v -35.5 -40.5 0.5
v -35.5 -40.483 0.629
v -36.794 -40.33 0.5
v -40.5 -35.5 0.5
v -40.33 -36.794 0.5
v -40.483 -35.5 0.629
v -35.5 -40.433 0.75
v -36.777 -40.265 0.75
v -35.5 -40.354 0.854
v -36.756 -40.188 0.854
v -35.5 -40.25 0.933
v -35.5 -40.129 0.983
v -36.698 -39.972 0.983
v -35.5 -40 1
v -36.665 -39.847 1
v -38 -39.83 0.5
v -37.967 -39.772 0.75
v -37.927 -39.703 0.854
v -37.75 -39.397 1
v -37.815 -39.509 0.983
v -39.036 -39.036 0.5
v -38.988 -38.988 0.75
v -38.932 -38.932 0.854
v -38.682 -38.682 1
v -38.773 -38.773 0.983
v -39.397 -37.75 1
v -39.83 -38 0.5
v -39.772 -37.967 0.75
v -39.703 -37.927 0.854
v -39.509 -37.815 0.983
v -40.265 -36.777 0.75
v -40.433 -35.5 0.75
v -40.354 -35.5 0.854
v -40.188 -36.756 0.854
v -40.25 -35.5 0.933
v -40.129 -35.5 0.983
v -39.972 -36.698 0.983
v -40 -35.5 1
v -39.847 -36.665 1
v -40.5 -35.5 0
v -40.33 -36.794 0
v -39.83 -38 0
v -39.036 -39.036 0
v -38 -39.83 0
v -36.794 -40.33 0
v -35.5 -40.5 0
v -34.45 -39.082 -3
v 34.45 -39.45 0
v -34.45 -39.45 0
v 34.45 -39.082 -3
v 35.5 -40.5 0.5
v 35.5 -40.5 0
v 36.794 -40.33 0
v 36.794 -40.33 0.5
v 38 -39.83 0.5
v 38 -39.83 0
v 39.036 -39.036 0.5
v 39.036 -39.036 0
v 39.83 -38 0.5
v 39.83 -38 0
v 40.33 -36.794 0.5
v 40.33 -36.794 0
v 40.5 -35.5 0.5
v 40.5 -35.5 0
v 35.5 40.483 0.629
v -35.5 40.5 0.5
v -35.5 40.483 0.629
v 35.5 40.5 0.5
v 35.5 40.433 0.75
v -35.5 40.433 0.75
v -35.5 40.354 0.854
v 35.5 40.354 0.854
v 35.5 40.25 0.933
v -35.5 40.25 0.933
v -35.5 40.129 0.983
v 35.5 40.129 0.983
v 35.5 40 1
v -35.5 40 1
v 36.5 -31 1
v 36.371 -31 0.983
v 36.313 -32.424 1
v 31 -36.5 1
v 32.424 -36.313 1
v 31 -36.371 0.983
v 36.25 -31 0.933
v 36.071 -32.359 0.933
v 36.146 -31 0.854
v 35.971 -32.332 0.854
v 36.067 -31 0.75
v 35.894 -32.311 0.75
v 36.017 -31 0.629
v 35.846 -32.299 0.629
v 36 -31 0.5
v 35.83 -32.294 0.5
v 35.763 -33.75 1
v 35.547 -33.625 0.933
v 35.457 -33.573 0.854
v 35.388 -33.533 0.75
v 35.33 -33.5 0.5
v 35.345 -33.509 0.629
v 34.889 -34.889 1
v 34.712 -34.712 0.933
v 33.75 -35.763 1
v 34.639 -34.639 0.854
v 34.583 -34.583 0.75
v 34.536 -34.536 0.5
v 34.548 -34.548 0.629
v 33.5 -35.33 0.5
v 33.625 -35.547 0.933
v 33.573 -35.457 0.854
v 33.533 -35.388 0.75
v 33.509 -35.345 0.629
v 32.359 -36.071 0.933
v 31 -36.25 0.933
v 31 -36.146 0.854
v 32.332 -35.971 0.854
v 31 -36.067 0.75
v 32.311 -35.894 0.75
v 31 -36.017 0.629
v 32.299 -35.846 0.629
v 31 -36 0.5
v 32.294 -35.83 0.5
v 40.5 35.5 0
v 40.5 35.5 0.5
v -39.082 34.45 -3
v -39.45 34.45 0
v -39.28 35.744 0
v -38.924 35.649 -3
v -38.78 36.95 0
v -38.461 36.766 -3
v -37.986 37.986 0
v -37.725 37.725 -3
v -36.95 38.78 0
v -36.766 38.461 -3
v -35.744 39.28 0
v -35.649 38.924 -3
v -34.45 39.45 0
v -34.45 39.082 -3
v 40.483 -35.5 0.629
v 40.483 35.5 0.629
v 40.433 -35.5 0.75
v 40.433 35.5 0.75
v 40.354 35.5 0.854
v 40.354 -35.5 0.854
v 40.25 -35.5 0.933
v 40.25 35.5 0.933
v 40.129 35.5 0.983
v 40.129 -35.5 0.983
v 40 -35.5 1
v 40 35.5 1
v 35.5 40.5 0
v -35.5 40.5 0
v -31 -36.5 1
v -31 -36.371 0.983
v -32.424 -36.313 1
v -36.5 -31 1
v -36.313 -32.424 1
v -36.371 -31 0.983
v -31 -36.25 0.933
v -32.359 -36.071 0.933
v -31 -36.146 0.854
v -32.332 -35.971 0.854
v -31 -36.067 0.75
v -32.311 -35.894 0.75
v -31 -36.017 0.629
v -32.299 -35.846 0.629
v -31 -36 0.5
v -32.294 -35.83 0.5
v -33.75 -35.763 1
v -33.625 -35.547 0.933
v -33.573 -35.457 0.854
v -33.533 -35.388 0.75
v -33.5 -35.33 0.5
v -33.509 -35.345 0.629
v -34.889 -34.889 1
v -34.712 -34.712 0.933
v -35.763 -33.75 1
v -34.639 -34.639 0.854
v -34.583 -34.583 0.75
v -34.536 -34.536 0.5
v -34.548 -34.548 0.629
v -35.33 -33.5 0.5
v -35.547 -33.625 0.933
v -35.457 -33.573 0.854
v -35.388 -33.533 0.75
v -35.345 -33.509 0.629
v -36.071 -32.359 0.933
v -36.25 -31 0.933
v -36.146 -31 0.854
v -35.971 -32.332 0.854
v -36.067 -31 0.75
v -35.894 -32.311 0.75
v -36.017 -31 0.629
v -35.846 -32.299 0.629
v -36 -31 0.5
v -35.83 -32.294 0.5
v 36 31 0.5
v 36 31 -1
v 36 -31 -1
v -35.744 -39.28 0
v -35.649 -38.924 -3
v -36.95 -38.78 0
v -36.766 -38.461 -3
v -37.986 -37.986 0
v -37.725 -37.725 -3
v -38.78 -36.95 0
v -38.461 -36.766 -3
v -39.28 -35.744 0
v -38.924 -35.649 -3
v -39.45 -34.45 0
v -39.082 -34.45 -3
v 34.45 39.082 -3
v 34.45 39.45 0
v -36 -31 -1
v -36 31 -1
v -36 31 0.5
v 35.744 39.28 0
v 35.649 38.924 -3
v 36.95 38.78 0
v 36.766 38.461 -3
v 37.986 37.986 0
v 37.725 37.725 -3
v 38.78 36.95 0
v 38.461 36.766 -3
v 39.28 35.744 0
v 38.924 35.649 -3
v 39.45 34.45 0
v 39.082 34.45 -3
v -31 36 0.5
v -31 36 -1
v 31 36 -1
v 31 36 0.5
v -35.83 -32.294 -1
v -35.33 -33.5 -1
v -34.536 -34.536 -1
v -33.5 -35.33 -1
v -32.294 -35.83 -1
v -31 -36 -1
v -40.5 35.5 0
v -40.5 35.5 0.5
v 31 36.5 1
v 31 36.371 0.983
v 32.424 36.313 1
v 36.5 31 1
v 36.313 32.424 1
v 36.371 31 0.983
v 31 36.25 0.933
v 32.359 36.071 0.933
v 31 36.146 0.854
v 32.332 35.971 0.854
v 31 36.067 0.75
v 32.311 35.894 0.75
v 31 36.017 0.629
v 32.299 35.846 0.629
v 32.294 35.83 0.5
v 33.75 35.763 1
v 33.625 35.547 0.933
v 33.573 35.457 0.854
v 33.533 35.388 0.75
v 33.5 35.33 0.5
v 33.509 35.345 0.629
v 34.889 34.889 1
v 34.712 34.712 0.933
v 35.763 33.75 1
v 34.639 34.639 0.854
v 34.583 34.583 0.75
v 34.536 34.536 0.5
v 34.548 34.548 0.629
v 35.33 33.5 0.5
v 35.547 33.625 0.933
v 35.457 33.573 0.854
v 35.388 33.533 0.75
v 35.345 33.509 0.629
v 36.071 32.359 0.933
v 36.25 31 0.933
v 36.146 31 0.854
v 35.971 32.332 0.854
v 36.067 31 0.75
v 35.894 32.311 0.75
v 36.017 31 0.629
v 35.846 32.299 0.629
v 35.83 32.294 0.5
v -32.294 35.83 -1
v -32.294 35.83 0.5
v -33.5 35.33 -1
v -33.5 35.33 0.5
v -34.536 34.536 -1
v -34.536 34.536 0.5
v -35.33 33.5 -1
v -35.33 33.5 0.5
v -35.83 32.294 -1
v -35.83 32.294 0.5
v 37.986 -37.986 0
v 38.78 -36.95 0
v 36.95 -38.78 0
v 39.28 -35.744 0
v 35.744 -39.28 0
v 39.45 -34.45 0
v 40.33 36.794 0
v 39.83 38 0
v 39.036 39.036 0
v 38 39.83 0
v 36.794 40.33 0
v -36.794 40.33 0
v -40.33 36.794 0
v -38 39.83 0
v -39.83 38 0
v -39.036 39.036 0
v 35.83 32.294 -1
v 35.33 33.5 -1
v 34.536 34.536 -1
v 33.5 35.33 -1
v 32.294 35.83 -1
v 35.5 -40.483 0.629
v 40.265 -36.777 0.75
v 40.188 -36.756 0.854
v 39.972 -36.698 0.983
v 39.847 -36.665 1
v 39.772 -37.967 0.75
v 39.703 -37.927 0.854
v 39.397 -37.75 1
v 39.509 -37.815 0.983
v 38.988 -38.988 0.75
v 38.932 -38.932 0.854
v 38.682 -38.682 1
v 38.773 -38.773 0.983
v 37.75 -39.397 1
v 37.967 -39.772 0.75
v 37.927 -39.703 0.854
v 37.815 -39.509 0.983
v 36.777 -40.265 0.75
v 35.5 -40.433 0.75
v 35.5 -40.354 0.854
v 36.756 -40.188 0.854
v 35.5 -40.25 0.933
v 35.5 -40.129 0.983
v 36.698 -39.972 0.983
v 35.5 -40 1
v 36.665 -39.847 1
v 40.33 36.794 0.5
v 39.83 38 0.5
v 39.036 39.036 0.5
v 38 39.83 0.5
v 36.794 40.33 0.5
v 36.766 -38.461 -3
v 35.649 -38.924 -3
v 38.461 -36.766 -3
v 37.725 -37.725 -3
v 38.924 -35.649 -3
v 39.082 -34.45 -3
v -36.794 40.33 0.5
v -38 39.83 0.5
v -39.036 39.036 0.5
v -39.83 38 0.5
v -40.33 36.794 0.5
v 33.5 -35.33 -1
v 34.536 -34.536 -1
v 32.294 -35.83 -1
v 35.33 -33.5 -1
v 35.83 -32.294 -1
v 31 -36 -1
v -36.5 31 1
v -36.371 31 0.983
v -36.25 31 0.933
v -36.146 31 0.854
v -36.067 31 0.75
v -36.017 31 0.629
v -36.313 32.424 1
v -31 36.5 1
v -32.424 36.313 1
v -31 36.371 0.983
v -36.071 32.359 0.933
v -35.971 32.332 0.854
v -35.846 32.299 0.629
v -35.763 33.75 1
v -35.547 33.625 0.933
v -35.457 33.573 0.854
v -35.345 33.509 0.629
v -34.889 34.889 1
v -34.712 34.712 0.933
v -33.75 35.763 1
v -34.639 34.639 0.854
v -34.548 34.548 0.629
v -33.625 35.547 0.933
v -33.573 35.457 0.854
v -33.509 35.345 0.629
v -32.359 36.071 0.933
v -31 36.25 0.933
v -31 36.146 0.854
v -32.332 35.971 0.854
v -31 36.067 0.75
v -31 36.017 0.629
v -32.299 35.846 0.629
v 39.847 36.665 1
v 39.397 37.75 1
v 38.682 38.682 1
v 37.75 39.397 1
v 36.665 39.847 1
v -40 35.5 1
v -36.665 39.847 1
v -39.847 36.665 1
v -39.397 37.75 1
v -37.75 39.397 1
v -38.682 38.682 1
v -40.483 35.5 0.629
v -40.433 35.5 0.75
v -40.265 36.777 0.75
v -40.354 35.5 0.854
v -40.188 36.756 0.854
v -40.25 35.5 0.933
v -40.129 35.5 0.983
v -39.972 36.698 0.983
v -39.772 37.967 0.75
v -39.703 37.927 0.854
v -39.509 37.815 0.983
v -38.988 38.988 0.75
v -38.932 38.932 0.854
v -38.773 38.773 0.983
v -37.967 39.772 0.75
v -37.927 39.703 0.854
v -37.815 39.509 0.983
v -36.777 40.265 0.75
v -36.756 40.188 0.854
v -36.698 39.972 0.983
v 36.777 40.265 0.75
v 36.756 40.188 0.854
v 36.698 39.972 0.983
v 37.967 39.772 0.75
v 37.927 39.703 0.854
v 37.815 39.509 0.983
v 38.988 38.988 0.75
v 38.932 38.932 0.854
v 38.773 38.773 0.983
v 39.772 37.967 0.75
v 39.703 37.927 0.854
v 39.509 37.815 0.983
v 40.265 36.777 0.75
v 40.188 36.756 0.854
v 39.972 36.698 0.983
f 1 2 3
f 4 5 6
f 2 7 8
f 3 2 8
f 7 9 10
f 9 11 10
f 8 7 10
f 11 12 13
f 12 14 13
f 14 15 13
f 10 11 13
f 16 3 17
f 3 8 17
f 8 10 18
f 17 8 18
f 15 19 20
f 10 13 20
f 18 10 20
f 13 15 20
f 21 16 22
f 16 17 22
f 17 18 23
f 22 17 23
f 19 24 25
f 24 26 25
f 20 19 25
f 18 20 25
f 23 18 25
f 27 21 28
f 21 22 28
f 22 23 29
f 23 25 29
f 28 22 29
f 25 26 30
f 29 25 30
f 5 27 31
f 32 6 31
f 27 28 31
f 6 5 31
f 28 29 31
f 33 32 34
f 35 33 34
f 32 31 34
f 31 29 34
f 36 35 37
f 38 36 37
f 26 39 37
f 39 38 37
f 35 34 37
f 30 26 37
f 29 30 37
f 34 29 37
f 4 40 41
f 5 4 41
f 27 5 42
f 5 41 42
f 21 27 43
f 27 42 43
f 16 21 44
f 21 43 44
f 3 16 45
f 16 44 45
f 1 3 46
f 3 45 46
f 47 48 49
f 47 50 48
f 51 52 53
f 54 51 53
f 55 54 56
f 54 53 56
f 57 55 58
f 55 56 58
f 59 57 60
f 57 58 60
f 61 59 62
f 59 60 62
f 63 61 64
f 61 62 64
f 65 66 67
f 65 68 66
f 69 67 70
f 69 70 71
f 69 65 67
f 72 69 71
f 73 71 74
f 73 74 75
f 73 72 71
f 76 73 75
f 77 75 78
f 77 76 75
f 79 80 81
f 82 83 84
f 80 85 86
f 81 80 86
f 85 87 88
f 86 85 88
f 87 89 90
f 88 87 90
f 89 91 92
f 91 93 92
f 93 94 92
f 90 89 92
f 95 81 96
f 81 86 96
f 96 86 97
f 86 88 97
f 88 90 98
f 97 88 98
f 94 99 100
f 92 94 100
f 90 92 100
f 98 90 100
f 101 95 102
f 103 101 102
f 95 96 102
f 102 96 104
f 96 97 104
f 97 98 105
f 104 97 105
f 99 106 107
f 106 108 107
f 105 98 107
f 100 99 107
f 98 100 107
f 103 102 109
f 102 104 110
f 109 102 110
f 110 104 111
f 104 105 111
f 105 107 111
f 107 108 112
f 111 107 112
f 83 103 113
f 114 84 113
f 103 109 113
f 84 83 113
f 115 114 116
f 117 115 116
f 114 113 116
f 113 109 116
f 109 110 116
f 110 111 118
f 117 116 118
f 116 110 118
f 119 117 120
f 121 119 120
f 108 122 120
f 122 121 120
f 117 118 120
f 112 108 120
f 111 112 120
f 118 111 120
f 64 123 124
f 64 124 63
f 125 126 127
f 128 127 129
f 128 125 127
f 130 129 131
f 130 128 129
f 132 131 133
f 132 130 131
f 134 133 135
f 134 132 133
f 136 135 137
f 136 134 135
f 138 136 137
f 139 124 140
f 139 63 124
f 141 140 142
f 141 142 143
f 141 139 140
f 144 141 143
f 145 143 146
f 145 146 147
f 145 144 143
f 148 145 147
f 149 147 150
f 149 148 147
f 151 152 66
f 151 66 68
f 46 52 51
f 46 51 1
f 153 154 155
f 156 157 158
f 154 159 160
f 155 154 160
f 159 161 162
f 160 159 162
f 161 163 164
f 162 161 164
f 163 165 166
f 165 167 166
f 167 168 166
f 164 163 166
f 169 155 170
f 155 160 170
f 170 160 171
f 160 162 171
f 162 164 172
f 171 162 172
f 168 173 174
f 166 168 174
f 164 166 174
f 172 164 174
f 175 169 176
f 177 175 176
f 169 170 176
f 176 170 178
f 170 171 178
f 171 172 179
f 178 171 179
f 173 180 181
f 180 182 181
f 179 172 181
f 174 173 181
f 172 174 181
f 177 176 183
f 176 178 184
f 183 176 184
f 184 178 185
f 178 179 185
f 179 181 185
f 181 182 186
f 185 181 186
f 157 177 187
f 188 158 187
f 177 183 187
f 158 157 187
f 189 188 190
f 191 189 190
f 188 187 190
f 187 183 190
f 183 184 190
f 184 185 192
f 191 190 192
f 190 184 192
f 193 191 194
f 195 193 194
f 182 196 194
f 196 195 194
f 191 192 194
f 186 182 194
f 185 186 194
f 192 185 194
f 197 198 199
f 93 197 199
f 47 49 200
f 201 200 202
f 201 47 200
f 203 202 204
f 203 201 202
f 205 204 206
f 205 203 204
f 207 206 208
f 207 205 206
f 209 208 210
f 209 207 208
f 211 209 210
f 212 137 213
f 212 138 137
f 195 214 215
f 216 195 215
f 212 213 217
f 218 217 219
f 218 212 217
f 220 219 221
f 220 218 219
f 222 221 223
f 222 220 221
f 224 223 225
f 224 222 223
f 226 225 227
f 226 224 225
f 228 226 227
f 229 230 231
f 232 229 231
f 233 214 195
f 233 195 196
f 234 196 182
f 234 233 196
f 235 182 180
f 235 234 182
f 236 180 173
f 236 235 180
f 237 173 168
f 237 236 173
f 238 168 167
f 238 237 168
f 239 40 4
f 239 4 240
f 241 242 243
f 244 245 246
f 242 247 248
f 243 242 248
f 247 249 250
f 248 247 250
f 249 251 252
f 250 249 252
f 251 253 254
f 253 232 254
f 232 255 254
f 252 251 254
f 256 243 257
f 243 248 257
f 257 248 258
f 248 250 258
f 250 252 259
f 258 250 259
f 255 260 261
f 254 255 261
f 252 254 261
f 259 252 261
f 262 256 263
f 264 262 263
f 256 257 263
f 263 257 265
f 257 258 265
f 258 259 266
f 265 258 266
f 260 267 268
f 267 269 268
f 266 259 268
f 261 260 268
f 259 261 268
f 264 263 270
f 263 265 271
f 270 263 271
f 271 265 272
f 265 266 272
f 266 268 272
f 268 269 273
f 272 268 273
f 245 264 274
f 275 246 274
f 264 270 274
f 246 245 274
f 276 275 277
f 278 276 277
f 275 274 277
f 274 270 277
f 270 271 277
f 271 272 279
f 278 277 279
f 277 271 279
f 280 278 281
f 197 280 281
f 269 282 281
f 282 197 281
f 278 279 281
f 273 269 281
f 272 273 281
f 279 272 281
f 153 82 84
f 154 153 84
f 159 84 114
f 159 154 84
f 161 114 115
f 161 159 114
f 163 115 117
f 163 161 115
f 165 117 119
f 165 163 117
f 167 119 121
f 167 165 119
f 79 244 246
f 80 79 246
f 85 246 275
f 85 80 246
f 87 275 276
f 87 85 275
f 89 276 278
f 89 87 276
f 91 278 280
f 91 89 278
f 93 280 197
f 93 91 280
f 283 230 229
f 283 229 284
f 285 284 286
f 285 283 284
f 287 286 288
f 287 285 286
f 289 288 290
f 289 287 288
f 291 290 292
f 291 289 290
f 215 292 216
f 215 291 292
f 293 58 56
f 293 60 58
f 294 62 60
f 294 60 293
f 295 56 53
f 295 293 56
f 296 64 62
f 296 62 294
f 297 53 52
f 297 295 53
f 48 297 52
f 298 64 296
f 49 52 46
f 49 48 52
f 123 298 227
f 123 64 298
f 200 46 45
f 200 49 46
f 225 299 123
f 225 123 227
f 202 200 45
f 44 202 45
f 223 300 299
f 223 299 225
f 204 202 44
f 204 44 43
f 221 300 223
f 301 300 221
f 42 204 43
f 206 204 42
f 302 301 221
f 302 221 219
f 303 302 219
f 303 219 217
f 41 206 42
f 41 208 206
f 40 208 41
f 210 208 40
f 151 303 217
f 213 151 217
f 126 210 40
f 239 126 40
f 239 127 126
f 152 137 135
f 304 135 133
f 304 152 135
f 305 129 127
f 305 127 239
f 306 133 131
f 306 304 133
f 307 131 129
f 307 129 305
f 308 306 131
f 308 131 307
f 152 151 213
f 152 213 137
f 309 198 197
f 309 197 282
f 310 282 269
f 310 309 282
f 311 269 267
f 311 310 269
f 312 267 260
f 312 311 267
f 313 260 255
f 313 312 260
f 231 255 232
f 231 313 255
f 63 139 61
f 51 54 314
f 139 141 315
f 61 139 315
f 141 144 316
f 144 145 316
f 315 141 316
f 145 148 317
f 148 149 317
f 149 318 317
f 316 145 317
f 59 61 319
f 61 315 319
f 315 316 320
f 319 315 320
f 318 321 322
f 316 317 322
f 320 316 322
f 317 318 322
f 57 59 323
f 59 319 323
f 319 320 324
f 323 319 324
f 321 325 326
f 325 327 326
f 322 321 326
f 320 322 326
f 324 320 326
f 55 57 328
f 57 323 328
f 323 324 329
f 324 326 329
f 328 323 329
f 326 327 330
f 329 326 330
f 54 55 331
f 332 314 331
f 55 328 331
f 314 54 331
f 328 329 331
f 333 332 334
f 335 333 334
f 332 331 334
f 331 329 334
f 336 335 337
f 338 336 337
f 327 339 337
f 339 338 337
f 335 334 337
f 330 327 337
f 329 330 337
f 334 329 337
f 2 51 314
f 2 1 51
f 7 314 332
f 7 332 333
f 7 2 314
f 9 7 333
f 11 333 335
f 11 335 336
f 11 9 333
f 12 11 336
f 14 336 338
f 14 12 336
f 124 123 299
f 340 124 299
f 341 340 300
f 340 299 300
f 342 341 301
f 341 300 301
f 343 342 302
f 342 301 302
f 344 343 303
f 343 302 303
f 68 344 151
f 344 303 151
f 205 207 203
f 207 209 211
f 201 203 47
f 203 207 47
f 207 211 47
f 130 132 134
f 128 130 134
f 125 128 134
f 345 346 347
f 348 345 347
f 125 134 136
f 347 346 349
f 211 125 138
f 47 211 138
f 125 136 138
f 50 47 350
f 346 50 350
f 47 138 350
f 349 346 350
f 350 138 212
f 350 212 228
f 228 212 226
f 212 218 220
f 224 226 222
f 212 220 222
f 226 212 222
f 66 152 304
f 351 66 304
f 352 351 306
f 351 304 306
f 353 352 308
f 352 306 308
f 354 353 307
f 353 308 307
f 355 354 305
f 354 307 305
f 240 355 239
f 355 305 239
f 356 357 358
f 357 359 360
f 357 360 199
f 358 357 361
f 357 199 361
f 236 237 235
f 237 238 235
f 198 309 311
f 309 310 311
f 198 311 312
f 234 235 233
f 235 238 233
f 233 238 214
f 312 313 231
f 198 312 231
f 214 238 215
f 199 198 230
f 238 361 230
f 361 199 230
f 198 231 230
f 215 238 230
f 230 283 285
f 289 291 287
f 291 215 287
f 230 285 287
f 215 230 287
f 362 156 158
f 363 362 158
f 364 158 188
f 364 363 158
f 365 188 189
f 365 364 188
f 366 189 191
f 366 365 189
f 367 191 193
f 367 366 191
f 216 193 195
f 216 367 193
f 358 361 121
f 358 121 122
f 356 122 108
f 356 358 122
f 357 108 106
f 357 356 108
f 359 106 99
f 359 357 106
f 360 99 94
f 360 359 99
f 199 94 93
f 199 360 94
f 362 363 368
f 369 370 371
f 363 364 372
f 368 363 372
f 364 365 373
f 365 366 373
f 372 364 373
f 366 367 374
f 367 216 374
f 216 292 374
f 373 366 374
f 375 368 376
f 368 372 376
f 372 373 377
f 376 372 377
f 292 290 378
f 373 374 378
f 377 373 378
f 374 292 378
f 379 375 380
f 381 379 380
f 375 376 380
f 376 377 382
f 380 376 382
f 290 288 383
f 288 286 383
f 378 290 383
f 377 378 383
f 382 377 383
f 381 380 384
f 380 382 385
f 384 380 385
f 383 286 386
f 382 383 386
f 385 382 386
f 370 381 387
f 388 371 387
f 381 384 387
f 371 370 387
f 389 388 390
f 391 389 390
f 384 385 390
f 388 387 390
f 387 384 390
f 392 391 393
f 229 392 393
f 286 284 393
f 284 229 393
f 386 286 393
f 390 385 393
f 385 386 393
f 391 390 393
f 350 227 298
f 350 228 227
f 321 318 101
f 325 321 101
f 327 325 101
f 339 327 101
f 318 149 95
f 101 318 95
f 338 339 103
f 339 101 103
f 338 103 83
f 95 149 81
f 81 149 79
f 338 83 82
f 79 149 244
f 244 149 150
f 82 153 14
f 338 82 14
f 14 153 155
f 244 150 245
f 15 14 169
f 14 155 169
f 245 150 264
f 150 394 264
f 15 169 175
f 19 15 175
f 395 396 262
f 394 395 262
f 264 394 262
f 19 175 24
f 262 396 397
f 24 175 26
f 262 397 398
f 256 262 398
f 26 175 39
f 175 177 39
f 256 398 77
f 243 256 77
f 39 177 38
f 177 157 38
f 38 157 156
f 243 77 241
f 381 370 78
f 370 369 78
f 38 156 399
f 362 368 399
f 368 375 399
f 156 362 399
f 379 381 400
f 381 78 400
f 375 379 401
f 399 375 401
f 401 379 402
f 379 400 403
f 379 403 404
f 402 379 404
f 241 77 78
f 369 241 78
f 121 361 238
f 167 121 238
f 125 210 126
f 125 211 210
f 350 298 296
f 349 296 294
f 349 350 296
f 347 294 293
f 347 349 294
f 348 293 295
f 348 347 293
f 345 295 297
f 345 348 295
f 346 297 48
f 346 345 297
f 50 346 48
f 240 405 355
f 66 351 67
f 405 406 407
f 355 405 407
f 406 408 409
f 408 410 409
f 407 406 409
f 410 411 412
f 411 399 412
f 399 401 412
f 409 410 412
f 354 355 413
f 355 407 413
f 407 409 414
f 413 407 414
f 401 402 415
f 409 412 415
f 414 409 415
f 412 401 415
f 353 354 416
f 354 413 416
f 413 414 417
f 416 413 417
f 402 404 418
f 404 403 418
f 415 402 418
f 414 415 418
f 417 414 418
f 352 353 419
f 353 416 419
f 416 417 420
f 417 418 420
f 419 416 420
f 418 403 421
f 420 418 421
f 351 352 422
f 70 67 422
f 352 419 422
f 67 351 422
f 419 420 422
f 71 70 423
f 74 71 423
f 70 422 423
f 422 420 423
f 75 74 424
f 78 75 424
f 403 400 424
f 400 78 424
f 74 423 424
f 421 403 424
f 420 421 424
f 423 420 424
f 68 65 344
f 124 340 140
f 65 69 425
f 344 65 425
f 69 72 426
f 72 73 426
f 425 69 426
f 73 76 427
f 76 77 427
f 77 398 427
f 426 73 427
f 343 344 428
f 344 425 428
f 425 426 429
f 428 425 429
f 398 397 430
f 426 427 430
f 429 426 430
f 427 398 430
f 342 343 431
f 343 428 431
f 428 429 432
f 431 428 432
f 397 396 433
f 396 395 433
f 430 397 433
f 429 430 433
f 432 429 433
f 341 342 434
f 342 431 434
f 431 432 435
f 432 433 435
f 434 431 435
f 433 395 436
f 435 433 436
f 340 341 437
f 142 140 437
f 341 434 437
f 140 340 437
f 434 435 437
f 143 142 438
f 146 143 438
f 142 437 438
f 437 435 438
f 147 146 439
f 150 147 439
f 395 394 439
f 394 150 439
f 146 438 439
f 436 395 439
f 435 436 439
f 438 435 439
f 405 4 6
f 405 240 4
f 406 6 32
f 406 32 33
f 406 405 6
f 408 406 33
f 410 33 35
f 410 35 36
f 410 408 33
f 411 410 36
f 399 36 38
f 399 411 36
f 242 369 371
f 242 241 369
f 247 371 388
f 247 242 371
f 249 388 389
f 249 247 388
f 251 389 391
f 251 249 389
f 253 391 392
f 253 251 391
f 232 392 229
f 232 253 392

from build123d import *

# Parameters (mm, degrees)
PAD_DEPTH    = 1
PAD001_DEPTH = 3
PAD001_TAPER = 7
POCKET_DEPTH = 2.001
FILLET002_R  = 0.5


with BuildPart() as part:
    # Sketch005 → Pad (new body)
    with BuildSketch(Plane.XY):
        with BuildLine():
            Line((-35.5, 40.5), (35.5, 40.5))
            ThreePointArc((40.5, 35.5), (39.035534, 39.035534), (35.5, 40.5))
            Line((40.5, 35.5), (40.5, -35.5))
            ThreePointArc((35.5, -40.5), (39.035534, -39.035534), (40.5, -35.5))
            Line((35.5, -40.5), (-35.5, -40.5))
            ThreePointArc((-40.5, -35.5), (-39.035534, -39.035534), (-35.5, -40.5))
            Line((-40.5, -35.5), (-40.5, 35.5))
            ThreePointArc((-35.5, 40.5), (-39.035534, 39.035534), (-40.5, 35.5))
        make_face()
    extrude(amount=PAD_DEPTH)

    # Sketch004 → Pad001 (join)
    with BuildSketch(Plane.XY):
        with BuildLine():
            Line((-34.45, 39.45), (34.45, 39.45))
            ThreePointArc((39.45, 34.45), (37.985534, 37.985534), (34.45, 39.45))
            Line((39.45, 34.45), (39.45, -34.45))
            ThreePointArc((34.45, -39.45), (37.985534, -37.985534), (39.45, -34.45))
            Line((34.45, -39.45), (-34.45, -39.45))
            ThreePointArc((-39.45, -34.45), (-37.985534, -37.985534), (-34.45, -39.45))
            Line((-39.45, -34.45), (-39.45, 34.45))
            ThreePointArc((-34.45, 39.45), (-37.985534, 37.985534), (-39.45, 34.45))
        make_face()
    extrude(amount=-PAD001_DEPTH, taper=PAD001_TAPER)

    # Sketch006 → Pocket (cut, through all)
    with BuildSketch(Plane.XY.offset(-1)):
        with BuildLine():
            Line((-31, 36), (31, 36))
            ThreePointArc((36, 31), (34.535534, 34.535534), (31, 36))
            Line((36, 31), (36, -31))
            ThreePointArc((31, -36), (34.535534, -34.535534), (36, -31))
            Line((31, -36), (-31, -36))
            ThreePointArc((-36, -31), (-34.535534, -34.535534), (-31, -36))
            Line((-36, -31), (-36, 31))
            ThreePointArc((-31, 36), (-34.535534, 34.535534), (-36, 31))
        make_face()
    extrude(amount=POCKET_DEPTH, mode=Mode.SUBTRACT)

    # Fillet002
    fillet002_edges = [part.edges().sort_by_distance(p)[0] for p in [
        (0, 36, 1),
        (-34.535534, 34.535534, 1),
        (-36, 0, 1),
        (-34.535534, -34.535534, 1),
        (0, -36, 1),
        (34.535534, -34.535534, 1),
        (36, 0, 1),
        (34.535534, 34.535534, 1),
        (0, 40.5, 1),
        (-39.035534, 39.035534, 1),
        (-40.5, 0, 1),
        (-39.035534, -39.035534, 1),
        (0, -40.5, 1),
        (39.035534, -39.035534, 1),
        (40.5, 0, 1),
        (39.035534, 39.035534, 1),
    ]]
    fillet(fillet002_edges, radius=FILLET002_R)


solid = part.part
